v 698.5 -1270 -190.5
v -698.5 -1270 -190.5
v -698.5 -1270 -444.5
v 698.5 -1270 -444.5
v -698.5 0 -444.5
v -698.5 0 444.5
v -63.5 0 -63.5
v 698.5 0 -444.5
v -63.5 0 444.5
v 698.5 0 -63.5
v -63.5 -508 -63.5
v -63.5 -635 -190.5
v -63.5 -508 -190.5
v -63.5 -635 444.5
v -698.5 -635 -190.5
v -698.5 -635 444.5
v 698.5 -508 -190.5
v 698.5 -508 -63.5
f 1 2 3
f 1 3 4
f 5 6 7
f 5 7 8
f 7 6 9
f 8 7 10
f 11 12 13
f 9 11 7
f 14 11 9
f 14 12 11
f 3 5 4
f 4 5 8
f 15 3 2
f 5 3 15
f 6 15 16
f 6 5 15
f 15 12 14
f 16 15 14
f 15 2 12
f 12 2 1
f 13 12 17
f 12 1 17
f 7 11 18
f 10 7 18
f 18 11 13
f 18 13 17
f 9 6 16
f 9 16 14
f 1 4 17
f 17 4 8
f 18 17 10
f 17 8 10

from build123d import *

# Parameters (mm, degrees)
F0_W     = 1397
F0_H     = 889
F1_DEPTH = 1270
F2_W     = 635
F2_H     = 635
F3_DEPTH = 1397.001
F4_W     = 762
F4_H     = 508
F5_DEPTH = 635.001
F6_W     = 762
F6_H     = 127
F7_DEPTH = 127


with BuildPart() as f1:
    # F0 (on Front) → F1 (new body)
    with BuildSketch(Plane.XZ):
        Rectangle(F0_W, F0_H)
    extrude(amount=F1_DEPTH)

    # F2 (on face) → F3 (cut, through all)
    with BuildSketch(Plane.YZ.offset(698.5)):
        with Locations((-952.5, 127)):
            Rectangle(F2_W, F2_H)
    extrude(amount=-F3_DEPTH, mode=Mode.SUBTRACT)

    # F4 (on face) → F5 (cut, through all)
    with BuildSketch(Plane.XZ.offset(635)):
        with Locations((317.5, 190.5)):
            Rectangle(F4_W, F4_H)
    extrude(amount=-F5_DEPTH, mode=Mode.SUBTRACT)

    # F6 (on face) → F7 (cut)
    with BuildSketch(Plane.XZ.offset(635)):
        with Locations((317.5, -127)):
            Rectangle(F6_W, F6_H)
    extrude(amount=-F7_DEPTH, mode=Mode.SUBTRACT)


solid = f1.part
